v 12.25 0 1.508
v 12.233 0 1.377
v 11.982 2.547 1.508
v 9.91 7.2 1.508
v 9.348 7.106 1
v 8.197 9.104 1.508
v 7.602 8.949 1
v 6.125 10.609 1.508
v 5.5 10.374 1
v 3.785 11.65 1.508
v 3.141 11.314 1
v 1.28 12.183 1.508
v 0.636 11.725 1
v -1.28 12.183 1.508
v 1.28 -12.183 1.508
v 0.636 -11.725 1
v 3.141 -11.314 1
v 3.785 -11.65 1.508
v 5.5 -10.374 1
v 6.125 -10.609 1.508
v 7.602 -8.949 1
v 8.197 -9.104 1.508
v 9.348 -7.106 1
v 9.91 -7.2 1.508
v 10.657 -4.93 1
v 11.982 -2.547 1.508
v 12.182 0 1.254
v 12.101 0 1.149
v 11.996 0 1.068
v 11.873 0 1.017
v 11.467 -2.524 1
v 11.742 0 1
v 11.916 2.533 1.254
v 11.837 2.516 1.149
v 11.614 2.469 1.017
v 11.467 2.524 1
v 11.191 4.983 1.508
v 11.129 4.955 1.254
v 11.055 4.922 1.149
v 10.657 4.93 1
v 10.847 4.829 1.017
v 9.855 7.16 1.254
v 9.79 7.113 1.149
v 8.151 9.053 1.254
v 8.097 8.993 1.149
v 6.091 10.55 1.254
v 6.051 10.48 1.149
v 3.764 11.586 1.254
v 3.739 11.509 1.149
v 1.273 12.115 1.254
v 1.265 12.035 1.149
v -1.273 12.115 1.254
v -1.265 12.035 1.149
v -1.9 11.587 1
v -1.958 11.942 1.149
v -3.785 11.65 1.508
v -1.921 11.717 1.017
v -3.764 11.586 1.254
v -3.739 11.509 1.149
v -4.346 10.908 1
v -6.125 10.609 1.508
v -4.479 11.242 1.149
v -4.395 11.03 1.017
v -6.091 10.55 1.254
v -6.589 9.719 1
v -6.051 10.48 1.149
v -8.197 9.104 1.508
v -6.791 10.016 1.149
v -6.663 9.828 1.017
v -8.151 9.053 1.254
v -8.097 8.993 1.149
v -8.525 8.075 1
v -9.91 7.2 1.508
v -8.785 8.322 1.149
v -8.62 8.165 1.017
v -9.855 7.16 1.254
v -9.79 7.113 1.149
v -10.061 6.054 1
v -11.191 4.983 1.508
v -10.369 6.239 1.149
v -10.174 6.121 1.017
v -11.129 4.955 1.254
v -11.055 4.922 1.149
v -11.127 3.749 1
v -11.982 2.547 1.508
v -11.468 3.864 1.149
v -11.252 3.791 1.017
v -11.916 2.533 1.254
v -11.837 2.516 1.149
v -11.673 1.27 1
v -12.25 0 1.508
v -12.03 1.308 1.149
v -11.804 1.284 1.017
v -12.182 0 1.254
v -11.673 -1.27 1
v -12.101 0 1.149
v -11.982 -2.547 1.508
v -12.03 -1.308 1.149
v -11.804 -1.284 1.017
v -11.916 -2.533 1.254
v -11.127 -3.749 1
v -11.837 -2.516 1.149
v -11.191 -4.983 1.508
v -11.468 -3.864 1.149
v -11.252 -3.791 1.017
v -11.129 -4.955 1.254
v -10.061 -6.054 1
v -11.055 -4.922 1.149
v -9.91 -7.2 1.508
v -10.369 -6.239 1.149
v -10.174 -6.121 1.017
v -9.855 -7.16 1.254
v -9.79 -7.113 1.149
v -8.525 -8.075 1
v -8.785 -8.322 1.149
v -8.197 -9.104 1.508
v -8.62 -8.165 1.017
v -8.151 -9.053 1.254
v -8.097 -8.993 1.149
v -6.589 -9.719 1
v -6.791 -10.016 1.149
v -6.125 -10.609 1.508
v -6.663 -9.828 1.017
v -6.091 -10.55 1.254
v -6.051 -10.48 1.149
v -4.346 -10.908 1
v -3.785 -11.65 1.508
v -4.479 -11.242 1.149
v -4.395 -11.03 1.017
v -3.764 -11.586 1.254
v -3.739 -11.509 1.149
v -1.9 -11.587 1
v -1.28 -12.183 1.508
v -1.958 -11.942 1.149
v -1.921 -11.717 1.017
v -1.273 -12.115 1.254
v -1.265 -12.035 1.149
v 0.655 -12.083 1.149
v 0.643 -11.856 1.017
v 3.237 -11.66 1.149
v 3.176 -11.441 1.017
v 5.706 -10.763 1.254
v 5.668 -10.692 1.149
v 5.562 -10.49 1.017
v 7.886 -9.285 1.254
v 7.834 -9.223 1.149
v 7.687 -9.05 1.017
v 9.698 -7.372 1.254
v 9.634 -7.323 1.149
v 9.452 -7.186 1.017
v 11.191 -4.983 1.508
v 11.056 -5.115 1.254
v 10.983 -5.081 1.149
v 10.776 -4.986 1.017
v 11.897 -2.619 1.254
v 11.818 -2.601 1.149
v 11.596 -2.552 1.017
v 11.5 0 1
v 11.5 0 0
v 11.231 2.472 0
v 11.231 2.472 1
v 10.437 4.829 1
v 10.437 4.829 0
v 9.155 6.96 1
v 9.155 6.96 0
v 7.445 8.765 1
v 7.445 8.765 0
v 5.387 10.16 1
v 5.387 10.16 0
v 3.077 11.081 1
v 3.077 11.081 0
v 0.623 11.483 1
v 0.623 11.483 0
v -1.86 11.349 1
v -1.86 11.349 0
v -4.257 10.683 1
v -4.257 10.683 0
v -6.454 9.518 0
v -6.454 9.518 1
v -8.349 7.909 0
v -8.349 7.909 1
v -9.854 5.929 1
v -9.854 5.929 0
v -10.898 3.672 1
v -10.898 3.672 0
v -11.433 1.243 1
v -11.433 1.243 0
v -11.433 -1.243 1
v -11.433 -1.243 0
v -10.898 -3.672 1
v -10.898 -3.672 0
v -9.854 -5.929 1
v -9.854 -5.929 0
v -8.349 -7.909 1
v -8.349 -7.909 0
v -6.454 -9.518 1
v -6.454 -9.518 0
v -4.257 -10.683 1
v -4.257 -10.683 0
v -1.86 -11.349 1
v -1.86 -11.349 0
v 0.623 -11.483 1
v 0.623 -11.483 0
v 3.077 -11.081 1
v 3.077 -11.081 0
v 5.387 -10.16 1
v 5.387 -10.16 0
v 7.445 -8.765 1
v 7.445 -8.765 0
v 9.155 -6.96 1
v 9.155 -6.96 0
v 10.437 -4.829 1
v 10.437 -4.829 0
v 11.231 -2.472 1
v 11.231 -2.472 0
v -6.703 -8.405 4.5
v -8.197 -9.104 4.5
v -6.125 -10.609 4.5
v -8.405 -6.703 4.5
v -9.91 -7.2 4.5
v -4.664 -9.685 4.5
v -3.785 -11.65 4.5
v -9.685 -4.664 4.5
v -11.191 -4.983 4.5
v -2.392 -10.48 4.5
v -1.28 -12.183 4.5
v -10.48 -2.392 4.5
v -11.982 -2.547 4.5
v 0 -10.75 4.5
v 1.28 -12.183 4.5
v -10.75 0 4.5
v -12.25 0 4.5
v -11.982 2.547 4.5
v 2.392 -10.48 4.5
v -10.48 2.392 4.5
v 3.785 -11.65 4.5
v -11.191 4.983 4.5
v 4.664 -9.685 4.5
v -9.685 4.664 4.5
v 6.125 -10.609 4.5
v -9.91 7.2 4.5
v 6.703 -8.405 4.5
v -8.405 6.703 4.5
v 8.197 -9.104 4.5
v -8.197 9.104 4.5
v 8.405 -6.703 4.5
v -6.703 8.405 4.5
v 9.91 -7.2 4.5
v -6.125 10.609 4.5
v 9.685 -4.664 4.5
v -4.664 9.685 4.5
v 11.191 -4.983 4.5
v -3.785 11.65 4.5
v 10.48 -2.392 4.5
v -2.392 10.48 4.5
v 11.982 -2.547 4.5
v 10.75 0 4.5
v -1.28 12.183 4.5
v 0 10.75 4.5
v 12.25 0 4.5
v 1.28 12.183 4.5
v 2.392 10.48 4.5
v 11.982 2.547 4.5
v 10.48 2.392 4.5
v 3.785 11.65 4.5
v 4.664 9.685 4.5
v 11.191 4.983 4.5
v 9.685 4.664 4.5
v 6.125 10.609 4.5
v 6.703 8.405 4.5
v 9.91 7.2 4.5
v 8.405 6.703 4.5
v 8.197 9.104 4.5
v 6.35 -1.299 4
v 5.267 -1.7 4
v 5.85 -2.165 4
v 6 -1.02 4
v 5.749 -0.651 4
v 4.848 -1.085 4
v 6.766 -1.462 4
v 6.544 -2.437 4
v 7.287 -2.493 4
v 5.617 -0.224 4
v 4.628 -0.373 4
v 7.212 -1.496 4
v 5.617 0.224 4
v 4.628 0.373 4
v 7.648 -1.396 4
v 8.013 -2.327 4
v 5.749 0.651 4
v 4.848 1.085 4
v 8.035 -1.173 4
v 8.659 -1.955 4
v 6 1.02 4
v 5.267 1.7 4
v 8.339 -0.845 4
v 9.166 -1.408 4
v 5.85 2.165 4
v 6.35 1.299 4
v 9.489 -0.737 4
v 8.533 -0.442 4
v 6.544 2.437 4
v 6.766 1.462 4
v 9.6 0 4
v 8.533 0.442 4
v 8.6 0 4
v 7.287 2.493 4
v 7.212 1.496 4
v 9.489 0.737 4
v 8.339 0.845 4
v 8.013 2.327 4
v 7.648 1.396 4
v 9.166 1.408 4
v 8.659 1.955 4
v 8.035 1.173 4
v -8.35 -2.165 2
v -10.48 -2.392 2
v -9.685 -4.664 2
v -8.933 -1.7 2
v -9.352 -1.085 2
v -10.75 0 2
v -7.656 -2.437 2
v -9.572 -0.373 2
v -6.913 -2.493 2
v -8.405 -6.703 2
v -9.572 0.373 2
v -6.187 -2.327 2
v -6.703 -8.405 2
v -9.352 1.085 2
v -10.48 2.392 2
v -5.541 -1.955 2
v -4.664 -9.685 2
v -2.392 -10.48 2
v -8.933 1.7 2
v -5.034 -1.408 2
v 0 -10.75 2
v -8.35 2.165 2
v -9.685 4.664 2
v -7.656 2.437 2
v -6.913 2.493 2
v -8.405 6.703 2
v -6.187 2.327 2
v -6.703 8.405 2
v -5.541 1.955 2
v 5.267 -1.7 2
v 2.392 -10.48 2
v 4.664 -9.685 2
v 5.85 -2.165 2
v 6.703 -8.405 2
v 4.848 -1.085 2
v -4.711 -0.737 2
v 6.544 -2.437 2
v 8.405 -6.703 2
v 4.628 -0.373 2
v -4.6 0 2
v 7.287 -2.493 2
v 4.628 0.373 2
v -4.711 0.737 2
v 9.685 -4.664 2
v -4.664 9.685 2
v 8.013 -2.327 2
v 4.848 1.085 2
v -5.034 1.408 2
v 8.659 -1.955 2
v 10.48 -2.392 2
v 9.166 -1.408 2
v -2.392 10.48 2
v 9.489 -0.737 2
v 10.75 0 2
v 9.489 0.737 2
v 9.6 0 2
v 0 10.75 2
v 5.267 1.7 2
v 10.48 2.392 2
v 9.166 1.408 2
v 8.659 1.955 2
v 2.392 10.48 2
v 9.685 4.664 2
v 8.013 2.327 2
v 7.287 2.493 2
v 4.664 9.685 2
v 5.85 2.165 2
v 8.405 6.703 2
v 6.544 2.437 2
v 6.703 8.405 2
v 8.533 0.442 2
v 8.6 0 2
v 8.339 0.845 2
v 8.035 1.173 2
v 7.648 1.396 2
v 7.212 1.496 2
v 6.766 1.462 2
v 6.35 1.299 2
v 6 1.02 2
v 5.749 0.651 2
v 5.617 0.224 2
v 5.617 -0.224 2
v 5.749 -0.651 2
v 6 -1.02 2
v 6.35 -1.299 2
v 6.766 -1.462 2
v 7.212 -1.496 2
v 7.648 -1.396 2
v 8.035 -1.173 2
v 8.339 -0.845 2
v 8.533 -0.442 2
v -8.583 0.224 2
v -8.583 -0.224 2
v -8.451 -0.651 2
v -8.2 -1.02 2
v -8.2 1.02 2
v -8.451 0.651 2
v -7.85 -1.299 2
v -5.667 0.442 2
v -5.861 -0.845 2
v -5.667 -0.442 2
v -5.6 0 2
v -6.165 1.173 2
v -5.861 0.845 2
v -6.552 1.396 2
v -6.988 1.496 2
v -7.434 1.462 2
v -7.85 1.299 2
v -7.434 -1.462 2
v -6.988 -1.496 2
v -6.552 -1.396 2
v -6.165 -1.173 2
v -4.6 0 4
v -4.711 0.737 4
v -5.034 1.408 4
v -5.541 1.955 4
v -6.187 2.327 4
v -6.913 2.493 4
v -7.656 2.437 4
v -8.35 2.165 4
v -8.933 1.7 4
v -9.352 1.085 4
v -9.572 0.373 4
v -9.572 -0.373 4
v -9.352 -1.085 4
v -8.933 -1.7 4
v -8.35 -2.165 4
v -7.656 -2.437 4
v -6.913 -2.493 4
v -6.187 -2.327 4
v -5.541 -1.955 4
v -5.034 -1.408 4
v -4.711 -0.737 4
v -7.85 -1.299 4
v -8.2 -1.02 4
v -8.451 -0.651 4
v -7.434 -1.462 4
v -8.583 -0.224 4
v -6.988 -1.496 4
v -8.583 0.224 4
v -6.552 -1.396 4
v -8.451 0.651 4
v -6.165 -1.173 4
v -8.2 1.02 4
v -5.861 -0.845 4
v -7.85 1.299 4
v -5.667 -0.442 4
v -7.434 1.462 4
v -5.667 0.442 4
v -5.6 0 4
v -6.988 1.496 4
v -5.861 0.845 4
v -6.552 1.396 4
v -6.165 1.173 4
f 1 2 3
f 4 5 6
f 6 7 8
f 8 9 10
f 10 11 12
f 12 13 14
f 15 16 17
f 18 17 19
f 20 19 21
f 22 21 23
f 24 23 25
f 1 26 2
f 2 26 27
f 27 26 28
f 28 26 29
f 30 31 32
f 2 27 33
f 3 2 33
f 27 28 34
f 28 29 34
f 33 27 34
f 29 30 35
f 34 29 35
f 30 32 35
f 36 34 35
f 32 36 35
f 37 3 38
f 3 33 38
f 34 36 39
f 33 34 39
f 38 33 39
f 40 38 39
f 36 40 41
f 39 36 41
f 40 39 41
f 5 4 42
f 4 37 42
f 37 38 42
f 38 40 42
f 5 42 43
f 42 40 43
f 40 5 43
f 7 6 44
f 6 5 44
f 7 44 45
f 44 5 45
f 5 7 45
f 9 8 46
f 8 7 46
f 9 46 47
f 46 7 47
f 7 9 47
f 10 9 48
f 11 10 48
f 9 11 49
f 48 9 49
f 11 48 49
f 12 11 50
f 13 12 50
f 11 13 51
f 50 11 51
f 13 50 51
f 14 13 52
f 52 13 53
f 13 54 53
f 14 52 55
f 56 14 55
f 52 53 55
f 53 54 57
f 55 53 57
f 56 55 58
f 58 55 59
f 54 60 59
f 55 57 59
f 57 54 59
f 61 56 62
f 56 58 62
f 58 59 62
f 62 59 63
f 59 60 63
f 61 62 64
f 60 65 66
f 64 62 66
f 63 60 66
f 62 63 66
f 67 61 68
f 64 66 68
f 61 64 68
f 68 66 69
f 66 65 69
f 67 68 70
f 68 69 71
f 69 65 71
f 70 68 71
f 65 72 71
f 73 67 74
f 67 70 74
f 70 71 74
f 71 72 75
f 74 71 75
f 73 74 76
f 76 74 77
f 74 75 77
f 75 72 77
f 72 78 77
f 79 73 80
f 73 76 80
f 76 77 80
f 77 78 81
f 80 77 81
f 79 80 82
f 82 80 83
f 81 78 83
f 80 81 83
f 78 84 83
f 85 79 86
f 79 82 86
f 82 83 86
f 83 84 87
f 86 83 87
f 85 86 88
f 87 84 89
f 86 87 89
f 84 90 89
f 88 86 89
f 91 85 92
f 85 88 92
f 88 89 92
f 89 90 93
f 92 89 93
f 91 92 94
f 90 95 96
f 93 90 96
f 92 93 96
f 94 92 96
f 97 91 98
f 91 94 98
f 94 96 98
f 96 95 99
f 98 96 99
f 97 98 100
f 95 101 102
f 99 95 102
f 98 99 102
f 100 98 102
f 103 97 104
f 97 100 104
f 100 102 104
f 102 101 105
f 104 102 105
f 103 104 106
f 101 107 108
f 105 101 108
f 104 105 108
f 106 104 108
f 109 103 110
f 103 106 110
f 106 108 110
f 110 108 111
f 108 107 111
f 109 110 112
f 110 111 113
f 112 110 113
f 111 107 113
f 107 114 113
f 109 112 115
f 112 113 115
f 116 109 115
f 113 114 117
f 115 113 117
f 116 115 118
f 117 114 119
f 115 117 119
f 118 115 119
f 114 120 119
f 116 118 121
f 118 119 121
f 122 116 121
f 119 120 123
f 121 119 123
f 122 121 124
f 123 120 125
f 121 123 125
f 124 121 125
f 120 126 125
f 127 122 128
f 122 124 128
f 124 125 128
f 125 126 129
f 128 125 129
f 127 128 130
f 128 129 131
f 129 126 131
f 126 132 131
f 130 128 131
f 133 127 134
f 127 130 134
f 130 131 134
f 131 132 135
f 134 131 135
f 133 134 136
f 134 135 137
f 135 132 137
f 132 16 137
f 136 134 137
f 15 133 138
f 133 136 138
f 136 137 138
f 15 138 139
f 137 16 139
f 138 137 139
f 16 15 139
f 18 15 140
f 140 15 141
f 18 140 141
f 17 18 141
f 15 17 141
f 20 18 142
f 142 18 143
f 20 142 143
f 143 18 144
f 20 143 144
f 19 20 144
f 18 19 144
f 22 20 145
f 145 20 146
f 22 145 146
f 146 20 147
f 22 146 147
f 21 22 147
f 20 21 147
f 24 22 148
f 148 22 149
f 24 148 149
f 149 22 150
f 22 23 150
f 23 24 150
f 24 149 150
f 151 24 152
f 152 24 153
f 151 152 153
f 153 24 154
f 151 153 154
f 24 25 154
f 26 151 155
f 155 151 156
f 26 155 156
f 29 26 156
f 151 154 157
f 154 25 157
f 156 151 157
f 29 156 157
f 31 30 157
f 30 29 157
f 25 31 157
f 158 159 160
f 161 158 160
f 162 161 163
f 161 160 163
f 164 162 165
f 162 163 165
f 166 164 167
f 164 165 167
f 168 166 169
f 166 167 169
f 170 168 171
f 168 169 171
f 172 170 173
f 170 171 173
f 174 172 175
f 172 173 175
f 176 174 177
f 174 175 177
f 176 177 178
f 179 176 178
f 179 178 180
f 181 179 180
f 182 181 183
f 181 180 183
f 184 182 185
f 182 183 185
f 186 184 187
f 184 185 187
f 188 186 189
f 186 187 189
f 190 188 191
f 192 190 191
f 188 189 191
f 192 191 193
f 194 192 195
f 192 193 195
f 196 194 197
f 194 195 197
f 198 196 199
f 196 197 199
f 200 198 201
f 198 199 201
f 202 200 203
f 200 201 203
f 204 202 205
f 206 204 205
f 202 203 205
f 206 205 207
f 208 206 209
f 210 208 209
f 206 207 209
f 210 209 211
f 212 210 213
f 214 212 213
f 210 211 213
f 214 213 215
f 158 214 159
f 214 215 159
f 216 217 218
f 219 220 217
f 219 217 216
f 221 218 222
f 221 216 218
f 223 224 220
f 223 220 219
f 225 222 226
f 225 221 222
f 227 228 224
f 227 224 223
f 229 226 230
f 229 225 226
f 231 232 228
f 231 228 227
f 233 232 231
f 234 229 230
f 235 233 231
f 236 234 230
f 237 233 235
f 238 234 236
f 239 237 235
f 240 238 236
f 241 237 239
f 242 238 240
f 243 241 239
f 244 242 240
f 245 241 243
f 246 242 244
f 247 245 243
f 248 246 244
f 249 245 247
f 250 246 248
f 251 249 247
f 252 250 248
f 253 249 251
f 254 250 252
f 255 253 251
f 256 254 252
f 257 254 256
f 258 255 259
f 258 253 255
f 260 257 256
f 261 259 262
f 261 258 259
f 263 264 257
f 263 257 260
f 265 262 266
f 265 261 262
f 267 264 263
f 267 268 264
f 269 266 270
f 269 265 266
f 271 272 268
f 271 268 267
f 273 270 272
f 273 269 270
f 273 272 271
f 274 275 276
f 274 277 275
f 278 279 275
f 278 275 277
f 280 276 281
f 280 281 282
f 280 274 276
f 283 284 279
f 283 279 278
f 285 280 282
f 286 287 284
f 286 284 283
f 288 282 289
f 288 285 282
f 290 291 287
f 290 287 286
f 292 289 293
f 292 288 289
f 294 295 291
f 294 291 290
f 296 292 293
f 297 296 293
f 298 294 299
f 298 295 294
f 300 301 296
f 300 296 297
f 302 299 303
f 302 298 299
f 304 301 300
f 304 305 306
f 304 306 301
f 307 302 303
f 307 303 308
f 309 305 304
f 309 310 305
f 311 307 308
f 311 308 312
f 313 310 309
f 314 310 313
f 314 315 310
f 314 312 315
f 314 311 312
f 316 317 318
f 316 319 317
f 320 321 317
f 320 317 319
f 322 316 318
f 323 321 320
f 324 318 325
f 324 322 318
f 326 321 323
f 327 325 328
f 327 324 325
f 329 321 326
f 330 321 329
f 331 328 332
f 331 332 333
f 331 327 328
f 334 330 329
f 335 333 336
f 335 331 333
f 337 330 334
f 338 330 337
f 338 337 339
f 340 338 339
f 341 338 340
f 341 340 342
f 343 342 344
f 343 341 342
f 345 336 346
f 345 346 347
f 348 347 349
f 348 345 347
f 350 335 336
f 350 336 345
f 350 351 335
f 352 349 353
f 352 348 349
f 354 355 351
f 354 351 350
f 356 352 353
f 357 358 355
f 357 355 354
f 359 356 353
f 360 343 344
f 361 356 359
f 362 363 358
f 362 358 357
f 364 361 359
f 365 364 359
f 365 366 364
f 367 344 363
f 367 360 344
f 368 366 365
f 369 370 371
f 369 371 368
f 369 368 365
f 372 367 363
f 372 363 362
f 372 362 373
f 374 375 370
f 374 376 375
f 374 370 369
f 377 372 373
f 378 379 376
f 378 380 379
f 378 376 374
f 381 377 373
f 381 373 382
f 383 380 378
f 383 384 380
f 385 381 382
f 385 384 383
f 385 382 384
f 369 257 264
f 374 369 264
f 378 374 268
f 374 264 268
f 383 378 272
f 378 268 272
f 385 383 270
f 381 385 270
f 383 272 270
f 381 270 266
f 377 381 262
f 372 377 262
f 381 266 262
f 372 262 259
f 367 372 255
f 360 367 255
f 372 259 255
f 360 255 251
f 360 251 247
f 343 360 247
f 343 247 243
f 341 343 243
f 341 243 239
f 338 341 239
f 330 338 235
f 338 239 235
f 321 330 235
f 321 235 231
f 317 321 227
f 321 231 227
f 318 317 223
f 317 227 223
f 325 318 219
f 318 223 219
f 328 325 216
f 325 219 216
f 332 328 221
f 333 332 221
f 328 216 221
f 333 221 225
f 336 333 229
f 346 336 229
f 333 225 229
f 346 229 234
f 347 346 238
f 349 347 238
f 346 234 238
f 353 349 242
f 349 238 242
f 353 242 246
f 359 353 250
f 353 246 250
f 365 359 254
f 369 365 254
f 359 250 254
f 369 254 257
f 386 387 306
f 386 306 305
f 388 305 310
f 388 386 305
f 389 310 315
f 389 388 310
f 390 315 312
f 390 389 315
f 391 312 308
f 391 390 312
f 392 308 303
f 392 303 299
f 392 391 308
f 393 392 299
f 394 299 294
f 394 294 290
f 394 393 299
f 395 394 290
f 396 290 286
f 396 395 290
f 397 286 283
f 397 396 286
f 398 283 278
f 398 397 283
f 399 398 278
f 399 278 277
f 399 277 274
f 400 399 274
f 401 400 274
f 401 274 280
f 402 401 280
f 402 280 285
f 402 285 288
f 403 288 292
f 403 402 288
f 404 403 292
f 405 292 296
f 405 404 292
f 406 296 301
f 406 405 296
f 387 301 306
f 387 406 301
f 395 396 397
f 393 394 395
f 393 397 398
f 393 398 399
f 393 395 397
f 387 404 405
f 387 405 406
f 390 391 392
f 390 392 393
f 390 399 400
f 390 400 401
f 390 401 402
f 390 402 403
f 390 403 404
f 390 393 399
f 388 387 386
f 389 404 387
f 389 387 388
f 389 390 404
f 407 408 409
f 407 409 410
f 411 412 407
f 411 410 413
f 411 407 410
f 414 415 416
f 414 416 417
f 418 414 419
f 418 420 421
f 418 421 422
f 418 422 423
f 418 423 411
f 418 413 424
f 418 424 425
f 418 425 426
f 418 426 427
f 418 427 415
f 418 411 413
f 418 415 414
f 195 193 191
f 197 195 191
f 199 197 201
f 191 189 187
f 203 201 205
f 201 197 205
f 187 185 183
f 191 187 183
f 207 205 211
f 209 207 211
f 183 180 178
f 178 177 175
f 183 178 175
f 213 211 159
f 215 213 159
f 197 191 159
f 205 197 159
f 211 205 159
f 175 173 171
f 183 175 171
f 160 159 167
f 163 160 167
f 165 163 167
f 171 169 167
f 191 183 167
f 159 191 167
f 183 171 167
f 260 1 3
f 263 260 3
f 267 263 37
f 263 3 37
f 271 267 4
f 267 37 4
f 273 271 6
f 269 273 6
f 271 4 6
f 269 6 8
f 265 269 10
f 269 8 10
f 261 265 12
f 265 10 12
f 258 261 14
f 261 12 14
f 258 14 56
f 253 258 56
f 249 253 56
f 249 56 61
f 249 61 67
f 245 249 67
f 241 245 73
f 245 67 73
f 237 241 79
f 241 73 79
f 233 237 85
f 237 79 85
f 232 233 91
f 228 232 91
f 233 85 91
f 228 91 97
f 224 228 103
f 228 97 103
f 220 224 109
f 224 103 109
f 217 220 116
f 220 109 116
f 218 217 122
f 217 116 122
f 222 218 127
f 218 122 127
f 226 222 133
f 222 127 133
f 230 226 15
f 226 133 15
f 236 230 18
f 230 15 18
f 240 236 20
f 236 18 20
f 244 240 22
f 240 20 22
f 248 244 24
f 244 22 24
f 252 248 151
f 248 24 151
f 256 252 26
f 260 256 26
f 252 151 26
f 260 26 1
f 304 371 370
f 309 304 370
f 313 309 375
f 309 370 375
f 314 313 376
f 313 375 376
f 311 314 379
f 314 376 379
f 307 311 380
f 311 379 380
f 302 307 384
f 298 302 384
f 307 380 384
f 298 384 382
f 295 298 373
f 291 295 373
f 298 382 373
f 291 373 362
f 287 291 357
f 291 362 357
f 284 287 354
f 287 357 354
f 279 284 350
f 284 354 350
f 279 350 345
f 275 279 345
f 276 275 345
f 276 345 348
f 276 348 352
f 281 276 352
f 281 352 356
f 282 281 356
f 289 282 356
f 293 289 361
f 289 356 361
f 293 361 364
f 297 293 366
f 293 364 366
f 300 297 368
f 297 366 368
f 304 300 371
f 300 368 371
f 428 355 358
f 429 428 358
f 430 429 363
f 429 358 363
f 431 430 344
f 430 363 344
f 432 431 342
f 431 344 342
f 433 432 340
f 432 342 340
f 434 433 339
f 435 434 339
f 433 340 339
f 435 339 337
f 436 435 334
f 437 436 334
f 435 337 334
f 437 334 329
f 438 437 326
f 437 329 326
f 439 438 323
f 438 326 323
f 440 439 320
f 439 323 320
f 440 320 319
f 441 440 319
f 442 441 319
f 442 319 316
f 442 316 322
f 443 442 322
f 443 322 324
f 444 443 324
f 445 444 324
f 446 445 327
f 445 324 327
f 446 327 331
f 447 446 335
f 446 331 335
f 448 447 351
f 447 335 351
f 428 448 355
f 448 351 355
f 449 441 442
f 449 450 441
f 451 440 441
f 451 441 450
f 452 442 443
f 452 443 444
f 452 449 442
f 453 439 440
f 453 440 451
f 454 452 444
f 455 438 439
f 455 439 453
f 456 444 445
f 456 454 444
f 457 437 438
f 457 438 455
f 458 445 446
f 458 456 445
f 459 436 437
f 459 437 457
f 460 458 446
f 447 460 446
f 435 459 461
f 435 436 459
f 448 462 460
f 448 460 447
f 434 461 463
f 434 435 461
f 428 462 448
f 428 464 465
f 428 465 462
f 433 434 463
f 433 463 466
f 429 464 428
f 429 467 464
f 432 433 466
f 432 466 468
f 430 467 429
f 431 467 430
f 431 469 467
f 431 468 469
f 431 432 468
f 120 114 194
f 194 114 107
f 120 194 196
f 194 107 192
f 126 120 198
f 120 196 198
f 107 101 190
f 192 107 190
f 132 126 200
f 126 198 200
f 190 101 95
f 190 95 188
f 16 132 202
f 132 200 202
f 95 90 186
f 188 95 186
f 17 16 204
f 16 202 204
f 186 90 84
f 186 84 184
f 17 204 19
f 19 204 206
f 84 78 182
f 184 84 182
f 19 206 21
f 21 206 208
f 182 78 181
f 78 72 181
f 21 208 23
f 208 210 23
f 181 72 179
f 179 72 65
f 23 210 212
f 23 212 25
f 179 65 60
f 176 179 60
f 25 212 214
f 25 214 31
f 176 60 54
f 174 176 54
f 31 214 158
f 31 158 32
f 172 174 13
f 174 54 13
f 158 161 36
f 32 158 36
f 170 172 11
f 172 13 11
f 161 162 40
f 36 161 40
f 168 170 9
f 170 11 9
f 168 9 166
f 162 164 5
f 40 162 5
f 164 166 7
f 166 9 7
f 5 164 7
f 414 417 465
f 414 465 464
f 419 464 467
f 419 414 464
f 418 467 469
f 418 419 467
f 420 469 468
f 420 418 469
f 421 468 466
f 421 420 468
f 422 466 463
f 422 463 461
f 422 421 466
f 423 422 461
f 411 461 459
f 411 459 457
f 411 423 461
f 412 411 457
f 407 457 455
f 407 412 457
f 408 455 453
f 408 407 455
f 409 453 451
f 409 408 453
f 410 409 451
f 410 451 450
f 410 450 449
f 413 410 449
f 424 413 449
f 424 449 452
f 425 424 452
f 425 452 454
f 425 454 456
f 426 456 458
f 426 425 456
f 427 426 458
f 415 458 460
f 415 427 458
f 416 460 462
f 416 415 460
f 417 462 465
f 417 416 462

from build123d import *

# Parameters (mm, degrees)
F0_R     = 11.5
F1_DEPTH = 1
F2_R     = 12.25
F3_DEPTH = 3.5
F4_R     = 10.75
F5_DEPTH = 2.5
F6_R     = 0.508
F7_R     = 2.5
F7_R_2   = 1.5
F8_DEPTH = 2


with BuildPart() as f1:
    # F0 (on Top) → F1 (new body)
    with BuildSketch(Plane.XY):
        Circle(F0_R)
    extrude(amount=F1_DEPTH)

    # F2 (on face) → F3 (join)
    with BuildSketch(Plane.XY.offset(1)):
        Circle(F2_R)
    extrude(amount=F3_DEPTH)

    # F4 (on face) → F5 (cut)
    with BuildSketch(Plane.XY.offset(4.5)):
        Circle(F4_R)
    extrude(amount=-F5_DEPTH, mode=Mode.SUBTRACT)

    # F6
    f6_edges = [f1.edges().sort_by_distance(p)[0] for p in [
        (-12.25, 0, 1),
    ]]
    fillet(f6_edges, radius=F6_R)

    # F7 (on face) → F8 (join)
    with BuildSketch(Plane.XY.offset(2)):
        with Locations((-7.1, 0)):
            Circle(F7_R)
        with Locations((-7.1, 0)):
            Circle(F7_R_2, mode=Mode.SUBTRACT)
        with Locations((7.1, 0)):
            Circle(F7_R)
        with Locations((7.1, 0)):
            Circle(F7_R_2, mode=Mode.SUBTRACT)
    extrude(amount=F8_DEPTH)


solid = f1.part
